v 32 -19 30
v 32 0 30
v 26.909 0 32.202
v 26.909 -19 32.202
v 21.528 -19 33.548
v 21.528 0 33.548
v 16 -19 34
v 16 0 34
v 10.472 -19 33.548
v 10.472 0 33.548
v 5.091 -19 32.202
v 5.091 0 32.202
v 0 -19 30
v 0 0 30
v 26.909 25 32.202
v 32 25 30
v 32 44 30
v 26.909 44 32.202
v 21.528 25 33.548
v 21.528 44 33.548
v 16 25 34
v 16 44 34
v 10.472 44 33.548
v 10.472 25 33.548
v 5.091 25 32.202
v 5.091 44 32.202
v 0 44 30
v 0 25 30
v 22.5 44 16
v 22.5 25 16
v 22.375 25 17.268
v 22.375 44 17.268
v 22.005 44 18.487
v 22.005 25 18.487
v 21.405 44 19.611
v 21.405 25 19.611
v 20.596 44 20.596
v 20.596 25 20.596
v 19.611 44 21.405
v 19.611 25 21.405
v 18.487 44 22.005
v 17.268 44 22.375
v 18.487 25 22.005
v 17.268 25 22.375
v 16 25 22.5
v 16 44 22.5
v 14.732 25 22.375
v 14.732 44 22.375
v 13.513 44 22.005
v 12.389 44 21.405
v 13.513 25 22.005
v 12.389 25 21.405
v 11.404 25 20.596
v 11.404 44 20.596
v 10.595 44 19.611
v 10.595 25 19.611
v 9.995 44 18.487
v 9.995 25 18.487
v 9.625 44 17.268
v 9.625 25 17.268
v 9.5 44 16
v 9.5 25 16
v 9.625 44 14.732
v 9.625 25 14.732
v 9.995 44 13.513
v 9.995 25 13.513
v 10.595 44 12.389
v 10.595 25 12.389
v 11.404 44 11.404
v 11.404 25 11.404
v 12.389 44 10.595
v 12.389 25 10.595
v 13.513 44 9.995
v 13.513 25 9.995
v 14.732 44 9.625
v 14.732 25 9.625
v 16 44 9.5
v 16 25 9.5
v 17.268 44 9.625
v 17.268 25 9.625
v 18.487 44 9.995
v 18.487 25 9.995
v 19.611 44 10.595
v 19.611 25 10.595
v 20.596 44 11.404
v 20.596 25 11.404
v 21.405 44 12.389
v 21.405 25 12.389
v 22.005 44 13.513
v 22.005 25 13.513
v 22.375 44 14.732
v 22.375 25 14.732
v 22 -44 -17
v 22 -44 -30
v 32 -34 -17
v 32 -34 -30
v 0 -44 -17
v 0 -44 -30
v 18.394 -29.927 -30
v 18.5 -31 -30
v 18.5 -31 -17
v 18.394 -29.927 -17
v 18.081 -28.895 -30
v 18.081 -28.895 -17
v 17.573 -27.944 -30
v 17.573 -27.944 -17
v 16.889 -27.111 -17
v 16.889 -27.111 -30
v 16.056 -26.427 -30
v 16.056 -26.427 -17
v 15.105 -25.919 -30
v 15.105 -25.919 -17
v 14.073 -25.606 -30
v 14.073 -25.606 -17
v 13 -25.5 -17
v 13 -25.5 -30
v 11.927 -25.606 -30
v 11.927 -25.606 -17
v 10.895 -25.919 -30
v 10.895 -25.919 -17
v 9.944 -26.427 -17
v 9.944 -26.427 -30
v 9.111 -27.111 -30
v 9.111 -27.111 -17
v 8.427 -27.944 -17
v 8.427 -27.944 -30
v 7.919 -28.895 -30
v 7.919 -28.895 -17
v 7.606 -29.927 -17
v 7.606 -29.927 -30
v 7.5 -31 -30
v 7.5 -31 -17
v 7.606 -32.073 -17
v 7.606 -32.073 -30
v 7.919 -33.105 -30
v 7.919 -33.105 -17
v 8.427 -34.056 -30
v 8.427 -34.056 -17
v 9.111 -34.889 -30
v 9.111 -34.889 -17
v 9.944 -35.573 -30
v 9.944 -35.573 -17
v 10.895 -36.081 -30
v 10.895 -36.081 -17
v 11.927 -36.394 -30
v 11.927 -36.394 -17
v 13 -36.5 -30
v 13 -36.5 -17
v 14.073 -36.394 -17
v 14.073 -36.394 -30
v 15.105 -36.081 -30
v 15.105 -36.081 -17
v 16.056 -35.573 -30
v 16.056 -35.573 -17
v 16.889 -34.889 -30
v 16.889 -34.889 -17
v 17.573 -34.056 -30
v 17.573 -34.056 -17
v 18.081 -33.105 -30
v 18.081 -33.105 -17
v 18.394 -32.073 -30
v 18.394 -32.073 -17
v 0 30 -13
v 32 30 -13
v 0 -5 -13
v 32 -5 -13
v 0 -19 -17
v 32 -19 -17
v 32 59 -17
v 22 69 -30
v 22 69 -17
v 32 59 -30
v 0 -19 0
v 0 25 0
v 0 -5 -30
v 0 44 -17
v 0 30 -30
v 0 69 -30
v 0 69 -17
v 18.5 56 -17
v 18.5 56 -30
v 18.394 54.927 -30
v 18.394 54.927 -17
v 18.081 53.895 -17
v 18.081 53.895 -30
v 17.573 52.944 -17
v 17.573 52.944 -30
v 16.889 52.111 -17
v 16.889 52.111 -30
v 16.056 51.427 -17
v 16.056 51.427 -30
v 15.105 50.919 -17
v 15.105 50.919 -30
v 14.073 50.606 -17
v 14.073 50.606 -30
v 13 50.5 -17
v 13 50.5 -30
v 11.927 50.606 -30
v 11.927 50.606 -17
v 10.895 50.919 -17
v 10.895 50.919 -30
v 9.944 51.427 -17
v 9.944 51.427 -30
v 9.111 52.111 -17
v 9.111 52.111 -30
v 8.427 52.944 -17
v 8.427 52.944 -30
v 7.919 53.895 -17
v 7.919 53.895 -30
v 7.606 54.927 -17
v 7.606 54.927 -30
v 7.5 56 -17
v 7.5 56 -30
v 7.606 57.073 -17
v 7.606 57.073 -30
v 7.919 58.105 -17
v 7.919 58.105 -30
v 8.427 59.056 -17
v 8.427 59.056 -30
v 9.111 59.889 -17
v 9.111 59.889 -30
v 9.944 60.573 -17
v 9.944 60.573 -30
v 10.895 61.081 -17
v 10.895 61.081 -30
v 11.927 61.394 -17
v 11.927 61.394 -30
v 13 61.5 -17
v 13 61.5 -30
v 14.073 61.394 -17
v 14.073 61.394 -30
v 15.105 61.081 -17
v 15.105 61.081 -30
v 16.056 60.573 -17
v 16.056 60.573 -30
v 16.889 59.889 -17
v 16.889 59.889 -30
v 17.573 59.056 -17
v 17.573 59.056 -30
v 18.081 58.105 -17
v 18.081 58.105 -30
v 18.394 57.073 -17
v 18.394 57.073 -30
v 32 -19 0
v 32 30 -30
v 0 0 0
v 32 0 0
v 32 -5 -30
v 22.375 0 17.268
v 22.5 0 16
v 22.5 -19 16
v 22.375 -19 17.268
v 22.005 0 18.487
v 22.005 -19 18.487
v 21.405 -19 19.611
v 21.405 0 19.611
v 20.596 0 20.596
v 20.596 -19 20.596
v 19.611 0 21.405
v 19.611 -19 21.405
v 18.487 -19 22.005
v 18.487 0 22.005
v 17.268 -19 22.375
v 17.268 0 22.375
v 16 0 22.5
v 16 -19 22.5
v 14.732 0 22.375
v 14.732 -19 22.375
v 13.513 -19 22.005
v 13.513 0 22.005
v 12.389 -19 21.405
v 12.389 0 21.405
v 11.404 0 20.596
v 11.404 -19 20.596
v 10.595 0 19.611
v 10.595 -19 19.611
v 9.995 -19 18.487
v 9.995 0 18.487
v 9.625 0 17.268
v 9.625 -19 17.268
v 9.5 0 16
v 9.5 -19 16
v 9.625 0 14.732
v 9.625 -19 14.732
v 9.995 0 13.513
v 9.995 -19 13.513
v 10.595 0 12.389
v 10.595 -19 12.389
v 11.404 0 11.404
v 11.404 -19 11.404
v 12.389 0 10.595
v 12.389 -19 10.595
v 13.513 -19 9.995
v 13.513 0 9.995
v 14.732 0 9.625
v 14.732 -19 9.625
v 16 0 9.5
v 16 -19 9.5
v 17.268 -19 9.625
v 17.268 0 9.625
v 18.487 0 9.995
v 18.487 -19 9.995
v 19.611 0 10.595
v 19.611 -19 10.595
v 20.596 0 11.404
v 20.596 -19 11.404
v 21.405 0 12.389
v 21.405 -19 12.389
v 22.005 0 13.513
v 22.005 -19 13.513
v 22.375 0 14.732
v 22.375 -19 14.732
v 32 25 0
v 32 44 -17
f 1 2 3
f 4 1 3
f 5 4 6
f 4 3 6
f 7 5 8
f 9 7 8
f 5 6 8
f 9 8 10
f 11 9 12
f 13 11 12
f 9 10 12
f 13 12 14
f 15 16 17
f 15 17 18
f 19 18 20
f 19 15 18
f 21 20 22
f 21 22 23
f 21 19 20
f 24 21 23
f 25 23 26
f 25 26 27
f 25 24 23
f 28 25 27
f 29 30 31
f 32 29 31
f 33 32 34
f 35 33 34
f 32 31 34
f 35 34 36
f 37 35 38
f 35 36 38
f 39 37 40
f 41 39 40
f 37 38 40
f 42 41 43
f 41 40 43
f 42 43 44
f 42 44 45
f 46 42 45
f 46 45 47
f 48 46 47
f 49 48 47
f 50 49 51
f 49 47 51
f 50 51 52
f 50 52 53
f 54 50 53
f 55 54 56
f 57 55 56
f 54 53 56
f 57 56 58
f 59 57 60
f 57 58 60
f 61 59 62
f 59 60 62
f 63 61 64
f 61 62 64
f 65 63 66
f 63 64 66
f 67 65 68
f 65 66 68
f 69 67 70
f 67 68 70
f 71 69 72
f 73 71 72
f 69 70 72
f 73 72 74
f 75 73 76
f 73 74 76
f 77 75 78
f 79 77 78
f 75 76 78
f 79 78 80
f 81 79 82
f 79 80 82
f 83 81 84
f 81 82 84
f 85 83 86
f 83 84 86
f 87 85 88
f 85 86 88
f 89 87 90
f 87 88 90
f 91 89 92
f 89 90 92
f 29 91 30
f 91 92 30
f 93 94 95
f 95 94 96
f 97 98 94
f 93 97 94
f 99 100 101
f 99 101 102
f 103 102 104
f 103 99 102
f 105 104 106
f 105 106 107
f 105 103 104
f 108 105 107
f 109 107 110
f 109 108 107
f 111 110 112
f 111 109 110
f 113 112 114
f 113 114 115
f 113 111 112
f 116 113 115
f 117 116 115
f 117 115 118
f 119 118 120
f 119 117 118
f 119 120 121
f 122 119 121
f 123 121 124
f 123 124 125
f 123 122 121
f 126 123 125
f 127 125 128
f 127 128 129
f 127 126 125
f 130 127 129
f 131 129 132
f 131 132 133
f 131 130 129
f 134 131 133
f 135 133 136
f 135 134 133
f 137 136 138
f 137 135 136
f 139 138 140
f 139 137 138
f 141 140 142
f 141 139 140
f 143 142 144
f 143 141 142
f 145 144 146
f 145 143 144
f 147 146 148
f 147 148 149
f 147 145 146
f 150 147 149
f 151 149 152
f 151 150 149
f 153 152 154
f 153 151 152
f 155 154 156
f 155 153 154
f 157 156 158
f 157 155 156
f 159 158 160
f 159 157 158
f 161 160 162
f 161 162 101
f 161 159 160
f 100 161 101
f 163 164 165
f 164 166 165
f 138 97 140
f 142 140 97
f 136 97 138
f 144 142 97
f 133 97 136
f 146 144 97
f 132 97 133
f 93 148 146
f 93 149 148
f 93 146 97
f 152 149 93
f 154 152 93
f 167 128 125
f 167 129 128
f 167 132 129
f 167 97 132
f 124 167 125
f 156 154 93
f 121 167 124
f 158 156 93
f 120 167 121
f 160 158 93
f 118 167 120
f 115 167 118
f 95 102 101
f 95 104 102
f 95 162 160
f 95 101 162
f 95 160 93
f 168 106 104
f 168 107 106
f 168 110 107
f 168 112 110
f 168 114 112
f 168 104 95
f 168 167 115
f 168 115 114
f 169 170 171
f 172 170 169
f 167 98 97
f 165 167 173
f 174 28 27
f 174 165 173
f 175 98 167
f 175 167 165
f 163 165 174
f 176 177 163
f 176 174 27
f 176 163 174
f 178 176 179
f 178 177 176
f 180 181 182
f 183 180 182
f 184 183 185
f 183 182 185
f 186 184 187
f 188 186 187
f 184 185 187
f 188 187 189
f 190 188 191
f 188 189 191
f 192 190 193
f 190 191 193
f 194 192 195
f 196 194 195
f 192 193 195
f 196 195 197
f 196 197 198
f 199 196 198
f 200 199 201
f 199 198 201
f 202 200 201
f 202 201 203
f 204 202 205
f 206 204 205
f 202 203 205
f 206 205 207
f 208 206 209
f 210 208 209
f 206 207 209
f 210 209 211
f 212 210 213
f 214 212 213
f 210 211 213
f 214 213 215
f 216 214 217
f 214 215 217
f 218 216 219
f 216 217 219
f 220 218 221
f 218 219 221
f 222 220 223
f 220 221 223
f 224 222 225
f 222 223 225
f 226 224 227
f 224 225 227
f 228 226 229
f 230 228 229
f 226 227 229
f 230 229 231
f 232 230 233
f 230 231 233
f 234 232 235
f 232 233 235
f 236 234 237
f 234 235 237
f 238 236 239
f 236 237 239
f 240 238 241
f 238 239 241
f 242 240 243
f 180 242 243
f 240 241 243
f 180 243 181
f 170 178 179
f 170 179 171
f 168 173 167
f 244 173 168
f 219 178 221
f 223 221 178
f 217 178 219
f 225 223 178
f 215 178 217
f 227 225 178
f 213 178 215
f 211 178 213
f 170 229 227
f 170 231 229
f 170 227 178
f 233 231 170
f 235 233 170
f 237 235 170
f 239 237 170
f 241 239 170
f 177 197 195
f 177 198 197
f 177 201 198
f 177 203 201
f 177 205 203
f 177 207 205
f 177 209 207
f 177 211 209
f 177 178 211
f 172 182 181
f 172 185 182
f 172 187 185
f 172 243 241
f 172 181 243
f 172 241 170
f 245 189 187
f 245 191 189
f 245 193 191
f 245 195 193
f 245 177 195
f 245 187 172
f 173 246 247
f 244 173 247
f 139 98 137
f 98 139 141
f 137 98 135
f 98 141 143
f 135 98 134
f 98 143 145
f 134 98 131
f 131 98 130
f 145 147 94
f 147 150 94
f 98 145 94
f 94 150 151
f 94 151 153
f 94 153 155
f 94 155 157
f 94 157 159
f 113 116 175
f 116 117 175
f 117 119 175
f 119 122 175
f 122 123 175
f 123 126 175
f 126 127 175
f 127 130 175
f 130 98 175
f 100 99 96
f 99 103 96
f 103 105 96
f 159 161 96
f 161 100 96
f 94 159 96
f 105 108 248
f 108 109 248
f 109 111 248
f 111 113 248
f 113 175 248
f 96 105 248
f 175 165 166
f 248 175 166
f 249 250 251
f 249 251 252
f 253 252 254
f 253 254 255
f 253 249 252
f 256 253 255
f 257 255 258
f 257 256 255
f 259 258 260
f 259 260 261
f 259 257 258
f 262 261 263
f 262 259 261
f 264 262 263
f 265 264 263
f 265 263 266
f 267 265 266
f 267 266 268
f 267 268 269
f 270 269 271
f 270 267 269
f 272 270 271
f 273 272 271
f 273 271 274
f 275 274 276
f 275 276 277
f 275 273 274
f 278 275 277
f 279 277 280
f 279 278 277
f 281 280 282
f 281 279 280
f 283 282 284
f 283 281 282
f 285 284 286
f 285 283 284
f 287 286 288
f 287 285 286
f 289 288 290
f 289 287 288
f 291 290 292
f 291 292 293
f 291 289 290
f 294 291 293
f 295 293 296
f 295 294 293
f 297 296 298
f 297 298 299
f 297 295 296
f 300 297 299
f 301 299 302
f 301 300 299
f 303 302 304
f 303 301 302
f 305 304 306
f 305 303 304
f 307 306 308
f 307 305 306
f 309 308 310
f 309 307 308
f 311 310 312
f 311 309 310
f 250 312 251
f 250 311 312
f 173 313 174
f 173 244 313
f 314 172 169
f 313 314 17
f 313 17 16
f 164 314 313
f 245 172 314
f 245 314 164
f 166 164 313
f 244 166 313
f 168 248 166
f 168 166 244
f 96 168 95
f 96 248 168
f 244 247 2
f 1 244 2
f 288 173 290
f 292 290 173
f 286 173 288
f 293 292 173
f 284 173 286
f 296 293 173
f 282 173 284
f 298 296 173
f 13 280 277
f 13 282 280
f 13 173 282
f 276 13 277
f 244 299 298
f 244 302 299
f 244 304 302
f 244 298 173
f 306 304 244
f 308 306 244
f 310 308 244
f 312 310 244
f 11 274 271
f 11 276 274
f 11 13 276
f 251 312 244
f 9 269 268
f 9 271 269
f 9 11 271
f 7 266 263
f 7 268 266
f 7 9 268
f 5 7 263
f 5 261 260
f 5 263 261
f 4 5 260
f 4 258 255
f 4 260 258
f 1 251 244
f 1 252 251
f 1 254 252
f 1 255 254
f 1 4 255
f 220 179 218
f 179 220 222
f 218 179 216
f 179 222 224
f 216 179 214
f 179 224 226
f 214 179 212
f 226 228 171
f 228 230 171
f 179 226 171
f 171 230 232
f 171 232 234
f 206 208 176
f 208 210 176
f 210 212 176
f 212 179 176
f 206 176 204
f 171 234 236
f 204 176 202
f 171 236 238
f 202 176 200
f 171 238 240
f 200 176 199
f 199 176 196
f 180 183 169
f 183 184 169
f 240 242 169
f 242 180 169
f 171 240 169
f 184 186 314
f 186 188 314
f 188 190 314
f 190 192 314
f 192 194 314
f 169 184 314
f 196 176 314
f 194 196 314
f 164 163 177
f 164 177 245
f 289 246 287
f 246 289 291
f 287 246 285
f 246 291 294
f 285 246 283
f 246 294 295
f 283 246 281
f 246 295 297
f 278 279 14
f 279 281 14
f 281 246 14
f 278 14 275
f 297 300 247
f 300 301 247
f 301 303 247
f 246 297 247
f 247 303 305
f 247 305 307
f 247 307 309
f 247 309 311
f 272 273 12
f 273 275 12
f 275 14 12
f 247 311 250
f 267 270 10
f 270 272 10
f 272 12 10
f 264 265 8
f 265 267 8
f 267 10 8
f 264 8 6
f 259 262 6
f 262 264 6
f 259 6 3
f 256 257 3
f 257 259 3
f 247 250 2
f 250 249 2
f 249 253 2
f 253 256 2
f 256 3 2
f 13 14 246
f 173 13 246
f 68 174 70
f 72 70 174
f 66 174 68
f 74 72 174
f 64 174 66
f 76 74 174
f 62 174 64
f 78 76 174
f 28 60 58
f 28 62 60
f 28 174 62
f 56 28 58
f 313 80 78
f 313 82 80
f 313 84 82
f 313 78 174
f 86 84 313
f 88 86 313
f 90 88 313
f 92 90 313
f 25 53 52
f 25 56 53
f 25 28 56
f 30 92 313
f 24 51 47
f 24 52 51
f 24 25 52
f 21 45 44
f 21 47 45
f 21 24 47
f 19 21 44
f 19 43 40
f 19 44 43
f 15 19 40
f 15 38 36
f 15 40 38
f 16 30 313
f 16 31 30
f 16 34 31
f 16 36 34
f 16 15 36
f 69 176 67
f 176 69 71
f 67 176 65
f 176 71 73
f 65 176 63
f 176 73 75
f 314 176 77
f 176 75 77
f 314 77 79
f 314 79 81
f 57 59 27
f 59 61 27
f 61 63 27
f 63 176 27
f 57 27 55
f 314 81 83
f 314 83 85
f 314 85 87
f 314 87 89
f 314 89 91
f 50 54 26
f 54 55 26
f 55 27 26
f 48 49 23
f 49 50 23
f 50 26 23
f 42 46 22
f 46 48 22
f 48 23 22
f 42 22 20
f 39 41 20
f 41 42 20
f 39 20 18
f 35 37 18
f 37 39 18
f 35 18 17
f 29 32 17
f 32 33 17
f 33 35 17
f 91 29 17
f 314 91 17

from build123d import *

# Parameters (mm, degrees)
F0_R          = 6.5
F1_DEPTH      = 19
F2_W          = 32
F2_H          = 13
F3_DEPTH      = 12.5
F3_DEPTH_BACK = 19
F4_W          = 32
F4_H          = 14
F5_DEPTH      = 17
F7_R          = 5.5
F8_DEPTH      = 13


with BuildPart() as f1:
    # F0 (on Front) → F1 (new body)
    with BuildSketch(Plane.XZ):
        with BuildLine():
            Line((0, 30), (0, 0))
            Line((0, 0), (32, 0))
            Line((32, 0), (32, 30))
            ThreePointArc((32, 30), (16, 34), (0, 30))
        make_face()
        with Locations((16, 16)):
            Circle(F0_R, mode=Mode.SUBTRACT)
    extrude(amount=F1_DEPTH)


with BuildPart() as f3:
    # F2 (on face) → F3 (new body, two sides)
    with BuildSketch(Plane(origin=(0, 0, 0), x_dir=(-1, 0, 0), z_dir=(0, 1, 0))) as f3_sk:
        with Locations((-16, -6.5)):
            Rectangle(F2_W, F2_H)
    extrude(amount=F3_DEPTH)
    extrude(f3_sk.sketch, amount=-F3_DEPTH_BACK)

    # F4 (on face) → F5 (join)
    with BuildSketch(Plane(origin=(0, 0, -13), x_dir=(1, 0, 0), z_dir=(0, 0, -1))):
        with Locations((16, 12)):
            Rectangle(F4_W, F4_H)
    extrude(amount=F5_DEPTH)

    # F7 (on offset) → F8 (join)
    with BuildSketch(Plane.XY.offset(-30)):
        Polygon((32, -19), (0, -19), (0, -44), (22, -44), (32, -34), align=None)
        with Locations((13, -31)):
            Circle(F7_R, mode=Mode.SUBTRACT)
    extrude(amount=F8_DEPTH)



with BuildPart() as f3_1:
    add(f3.part)
    # F10: F1, F3 across plane
    add(f1.part.mirror(Plane.XZ.offset(-12.5)))
    add(f3.part.mirror(Plane.XZ.offset(-12.5)))


solid = Compound([f1.part, f3_1.part])
